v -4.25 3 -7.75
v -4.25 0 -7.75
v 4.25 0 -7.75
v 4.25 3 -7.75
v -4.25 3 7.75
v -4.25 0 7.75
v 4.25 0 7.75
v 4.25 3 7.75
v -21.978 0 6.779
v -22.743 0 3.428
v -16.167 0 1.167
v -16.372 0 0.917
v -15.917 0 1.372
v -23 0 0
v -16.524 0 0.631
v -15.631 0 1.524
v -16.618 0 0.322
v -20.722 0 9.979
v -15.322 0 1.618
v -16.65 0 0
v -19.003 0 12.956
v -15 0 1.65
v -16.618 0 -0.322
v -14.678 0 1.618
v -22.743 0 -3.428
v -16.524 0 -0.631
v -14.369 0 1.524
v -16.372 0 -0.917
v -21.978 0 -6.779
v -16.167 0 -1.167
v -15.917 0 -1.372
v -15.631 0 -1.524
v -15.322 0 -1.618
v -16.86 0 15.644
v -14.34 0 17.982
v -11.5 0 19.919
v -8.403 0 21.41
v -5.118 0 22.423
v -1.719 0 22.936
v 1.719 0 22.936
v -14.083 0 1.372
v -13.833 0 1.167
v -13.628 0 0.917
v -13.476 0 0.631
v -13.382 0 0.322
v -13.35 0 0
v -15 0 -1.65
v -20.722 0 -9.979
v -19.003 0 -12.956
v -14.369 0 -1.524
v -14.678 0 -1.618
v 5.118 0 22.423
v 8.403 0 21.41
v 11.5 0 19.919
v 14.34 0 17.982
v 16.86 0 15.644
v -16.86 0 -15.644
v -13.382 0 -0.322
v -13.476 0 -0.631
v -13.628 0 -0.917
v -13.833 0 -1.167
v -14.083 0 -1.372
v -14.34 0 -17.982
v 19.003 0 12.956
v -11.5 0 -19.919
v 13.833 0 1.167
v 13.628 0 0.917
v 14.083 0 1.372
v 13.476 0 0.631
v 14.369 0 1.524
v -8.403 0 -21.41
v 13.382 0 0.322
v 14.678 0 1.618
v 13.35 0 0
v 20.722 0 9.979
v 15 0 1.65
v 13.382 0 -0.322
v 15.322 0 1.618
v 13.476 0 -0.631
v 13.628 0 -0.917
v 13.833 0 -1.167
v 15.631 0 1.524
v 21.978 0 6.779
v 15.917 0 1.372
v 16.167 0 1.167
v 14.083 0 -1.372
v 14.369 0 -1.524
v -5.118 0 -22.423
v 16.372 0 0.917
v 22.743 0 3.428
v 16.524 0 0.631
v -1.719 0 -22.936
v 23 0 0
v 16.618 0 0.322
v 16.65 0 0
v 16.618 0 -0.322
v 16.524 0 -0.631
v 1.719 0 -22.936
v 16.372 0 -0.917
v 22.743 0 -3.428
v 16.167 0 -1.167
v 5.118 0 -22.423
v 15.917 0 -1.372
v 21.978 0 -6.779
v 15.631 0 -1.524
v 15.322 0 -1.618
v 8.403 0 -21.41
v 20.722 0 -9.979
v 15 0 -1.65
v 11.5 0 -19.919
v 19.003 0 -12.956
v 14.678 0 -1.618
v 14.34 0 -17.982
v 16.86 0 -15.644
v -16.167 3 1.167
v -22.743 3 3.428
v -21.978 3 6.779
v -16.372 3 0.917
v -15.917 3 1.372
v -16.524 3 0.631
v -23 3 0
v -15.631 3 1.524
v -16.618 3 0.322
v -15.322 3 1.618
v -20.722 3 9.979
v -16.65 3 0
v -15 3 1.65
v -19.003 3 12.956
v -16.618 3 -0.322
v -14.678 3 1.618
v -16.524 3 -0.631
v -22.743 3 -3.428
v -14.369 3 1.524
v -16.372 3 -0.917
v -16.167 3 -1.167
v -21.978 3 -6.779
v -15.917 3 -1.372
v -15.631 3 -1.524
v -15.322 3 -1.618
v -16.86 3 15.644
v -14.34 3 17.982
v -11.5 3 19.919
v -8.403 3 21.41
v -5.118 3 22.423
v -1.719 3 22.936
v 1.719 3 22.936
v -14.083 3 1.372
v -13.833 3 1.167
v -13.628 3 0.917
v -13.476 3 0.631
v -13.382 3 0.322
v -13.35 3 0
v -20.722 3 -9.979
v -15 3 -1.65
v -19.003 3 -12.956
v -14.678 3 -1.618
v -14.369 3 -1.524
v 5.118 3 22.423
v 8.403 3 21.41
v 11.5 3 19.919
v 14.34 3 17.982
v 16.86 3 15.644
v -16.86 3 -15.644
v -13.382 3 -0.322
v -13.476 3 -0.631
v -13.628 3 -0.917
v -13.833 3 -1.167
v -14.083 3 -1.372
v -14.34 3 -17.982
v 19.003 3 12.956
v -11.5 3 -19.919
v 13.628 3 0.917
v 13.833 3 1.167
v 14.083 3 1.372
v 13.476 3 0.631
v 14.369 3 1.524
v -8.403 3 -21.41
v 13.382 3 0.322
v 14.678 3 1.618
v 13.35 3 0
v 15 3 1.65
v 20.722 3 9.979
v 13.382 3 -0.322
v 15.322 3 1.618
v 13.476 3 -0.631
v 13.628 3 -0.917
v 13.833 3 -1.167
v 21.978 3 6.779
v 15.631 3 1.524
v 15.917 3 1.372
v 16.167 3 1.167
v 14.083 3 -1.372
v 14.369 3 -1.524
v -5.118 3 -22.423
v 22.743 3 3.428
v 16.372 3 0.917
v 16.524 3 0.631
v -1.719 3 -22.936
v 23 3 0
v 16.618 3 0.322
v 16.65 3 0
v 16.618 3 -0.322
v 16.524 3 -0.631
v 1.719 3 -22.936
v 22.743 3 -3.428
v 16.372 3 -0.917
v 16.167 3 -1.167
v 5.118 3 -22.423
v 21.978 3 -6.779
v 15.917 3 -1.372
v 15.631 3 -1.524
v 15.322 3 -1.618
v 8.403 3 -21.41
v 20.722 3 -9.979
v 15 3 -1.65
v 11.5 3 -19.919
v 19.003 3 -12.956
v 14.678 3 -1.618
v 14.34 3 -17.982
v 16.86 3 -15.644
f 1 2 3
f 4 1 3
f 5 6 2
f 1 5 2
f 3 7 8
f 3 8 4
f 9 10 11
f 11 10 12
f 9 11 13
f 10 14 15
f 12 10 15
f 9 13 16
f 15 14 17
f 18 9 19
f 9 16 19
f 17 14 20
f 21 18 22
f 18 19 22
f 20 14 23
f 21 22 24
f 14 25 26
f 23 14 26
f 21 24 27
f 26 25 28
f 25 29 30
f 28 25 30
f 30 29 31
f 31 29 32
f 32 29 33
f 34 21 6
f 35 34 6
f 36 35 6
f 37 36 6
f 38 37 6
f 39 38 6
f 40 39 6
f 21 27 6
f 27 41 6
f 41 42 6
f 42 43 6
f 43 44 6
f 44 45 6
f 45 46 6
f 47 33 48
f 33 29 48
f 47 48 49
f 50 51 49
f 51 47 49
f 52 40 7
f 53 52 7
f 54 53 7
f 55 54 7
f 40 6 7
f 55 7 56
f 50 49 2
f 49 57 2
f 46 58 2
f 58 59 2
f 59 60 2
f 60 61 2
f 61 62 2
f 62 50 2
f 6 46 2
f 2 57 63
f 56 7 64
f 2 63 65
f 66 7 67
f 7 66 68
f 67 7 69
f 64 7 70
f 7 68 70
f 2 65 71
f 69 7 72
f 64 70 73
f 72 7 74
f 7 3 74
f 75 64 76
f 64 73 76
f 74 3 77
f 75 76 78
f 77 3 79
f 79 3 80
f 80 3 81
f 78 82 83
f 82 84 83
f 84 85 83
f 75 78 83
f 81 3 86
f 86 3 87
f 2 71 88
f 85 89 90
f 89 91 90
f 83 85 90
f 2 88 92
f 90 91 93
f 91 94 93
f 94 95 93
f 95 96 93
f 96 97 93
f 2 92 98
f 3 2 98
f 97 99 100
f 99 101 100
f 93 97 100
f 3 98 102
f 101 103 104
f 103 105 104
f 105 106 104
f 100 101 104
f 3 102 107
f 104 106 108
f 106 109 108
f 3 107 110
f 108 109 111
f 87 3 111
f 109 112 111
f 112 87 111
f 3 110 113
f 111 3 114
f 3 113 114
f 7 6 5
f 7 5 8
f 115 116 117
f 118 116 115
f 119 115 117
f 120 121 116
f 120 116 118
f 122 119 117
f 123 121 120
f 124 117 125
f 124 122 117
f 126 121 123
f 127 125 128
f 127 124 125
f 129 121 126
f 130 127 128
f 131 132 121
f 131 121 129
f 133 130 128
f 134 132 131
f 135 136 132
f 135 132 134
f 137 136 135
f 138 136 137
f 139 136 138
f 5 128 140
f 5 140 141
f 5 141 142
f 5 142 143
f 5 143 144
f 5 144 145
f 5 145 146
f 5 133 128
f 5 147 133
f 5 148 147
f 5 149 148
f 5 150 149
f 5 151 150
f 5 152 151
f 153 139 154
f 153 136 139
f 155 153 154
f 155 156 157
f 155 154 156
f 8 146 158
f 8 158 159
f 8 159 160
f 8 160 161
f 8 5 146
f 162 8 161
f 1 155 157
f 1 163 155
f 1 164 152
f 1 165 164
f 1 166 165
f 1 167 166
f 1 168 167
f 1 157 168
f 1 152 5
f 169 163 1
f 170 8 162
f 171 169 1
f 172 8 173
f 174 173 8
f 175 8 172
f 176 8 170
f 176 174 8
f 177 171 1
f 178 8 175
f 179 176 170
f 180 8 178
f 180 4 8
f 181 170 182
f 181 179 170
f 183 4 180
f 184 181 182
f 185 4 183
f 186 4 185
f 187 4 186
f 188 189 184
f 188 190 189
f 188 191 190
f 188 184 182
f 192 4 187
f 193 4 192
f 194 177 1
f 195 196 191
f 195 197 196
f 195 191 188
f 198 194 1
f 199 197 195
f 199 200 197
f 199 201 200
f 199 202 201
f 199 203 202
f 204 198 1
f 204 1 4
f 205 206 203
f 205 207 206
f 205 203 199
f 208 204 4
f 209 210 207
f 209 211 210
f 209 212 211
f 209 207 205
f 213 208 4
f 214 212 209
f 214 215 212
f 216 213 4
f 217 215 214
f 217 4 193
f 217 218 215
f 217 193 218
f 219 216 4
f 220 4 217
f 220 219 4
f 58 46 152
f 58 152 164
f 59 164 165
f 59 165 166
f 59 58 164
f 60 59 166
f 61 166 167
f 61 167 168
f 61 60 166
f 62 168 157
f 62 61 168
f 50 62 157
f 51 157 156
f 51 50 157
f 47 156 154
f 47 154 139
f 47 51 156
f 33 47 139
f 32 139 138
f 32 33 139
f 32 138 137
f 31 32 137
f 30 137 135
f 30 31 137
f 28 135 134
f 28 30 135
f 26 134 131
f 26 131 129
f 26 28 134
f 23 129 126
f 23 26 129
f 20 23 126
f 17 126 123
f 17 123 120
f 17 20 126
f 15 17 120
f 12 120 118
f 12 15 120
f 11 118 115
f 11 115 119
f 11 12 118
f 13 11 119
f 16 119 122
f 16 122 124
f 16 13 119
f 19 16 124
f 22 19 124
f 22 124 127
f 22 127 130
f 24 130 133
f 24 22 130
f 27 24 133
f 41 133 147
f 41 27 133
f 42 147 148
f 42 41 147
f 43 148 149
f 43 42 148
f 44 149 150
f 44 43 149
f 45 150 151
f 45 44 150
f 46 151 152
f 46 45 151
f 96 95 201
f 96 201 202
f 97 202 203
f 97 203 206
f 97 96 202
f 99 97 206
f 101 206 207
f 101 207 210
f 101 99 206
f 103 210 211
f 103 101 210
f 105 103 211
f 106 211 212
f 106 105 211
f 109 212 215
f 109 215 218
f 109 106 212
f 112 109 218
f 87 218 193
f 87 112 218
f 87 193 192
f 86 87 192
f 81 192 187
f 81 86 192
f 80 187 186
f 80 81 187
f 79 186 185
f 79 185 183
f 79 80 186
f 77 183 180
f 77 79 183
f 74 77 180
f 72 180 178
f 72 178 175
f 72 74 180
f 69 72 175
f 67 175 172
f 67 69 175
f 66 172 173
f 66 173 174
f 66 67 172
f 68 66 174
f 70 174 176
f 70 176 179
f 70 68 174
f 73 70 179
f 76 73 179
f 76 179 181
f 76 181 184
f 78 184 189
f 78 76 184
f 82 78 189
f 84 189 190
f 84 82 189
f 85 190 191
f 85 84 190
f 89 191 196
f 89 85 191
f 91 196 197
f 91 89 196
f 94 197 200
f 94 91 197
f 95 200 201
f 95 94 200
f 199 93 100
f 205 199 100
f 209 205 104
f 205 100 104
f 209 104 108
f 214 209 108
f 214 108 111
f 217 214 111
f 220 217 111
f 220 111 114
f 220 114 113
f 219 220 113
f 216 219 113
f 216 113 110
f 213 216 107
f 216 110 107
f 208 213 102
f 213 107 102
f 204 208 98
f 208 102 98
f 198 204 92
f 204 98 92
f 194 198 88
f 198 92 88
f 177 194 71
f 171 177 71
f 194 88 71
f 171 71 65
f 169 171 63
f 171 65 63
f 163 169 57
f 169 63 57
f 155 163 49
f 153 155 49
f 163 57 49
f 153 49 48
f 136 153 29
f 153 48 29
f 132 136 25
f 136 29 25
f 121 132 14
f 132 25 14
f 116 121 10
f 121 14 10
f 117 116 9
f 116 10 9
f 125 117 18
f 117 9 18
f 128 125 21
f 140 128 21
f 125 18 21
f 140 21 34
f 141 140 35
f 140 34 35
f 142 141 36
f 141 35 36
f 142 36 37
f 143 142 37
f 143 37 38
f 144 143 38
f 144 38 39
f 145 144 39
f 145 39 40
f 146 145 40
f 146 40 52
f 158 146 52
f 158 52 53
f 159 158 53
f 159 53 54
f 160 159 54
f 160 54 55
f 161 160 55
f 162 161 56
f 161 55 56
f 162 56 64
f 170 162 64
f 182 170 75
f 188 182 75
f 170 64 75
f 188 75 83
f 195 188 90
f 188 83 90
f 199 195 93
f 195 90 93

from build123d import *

# Parameters (mm, degrees)
SKETCH1_R           = 23
SKETCH1_R_2         = 1.65
SKETCH1_W           = 8.5
SKETCH1_H           = 15.5
BOSS_EXTRUDE1_DEPTH = 3


with BuildPart() as part:
    # Sketch1 → Boss-Extrude1 (new body)
    with BuildSketch(Plane(origin=(0, 0, 0), x_dir=(1, 0, 0), z_dir=(0, 1, 0))):
        Circle(SKETCH1_R)
        with Locations((-15, 0)):
            Circle(SKETCH1_R_2, mode=Mode.SUBTRACT)
        with Locations((15, 0)):
            Circle(SKETCH1_R_2, mode=Mode.SUBTRACT)
        Rectangle(SKETCH1_W, SKETCH1_H, mode=Mode.SUBTRACT)
    extrude(amount=BOSS_EXTRUDE1_DEPTH)


solid = part.part
